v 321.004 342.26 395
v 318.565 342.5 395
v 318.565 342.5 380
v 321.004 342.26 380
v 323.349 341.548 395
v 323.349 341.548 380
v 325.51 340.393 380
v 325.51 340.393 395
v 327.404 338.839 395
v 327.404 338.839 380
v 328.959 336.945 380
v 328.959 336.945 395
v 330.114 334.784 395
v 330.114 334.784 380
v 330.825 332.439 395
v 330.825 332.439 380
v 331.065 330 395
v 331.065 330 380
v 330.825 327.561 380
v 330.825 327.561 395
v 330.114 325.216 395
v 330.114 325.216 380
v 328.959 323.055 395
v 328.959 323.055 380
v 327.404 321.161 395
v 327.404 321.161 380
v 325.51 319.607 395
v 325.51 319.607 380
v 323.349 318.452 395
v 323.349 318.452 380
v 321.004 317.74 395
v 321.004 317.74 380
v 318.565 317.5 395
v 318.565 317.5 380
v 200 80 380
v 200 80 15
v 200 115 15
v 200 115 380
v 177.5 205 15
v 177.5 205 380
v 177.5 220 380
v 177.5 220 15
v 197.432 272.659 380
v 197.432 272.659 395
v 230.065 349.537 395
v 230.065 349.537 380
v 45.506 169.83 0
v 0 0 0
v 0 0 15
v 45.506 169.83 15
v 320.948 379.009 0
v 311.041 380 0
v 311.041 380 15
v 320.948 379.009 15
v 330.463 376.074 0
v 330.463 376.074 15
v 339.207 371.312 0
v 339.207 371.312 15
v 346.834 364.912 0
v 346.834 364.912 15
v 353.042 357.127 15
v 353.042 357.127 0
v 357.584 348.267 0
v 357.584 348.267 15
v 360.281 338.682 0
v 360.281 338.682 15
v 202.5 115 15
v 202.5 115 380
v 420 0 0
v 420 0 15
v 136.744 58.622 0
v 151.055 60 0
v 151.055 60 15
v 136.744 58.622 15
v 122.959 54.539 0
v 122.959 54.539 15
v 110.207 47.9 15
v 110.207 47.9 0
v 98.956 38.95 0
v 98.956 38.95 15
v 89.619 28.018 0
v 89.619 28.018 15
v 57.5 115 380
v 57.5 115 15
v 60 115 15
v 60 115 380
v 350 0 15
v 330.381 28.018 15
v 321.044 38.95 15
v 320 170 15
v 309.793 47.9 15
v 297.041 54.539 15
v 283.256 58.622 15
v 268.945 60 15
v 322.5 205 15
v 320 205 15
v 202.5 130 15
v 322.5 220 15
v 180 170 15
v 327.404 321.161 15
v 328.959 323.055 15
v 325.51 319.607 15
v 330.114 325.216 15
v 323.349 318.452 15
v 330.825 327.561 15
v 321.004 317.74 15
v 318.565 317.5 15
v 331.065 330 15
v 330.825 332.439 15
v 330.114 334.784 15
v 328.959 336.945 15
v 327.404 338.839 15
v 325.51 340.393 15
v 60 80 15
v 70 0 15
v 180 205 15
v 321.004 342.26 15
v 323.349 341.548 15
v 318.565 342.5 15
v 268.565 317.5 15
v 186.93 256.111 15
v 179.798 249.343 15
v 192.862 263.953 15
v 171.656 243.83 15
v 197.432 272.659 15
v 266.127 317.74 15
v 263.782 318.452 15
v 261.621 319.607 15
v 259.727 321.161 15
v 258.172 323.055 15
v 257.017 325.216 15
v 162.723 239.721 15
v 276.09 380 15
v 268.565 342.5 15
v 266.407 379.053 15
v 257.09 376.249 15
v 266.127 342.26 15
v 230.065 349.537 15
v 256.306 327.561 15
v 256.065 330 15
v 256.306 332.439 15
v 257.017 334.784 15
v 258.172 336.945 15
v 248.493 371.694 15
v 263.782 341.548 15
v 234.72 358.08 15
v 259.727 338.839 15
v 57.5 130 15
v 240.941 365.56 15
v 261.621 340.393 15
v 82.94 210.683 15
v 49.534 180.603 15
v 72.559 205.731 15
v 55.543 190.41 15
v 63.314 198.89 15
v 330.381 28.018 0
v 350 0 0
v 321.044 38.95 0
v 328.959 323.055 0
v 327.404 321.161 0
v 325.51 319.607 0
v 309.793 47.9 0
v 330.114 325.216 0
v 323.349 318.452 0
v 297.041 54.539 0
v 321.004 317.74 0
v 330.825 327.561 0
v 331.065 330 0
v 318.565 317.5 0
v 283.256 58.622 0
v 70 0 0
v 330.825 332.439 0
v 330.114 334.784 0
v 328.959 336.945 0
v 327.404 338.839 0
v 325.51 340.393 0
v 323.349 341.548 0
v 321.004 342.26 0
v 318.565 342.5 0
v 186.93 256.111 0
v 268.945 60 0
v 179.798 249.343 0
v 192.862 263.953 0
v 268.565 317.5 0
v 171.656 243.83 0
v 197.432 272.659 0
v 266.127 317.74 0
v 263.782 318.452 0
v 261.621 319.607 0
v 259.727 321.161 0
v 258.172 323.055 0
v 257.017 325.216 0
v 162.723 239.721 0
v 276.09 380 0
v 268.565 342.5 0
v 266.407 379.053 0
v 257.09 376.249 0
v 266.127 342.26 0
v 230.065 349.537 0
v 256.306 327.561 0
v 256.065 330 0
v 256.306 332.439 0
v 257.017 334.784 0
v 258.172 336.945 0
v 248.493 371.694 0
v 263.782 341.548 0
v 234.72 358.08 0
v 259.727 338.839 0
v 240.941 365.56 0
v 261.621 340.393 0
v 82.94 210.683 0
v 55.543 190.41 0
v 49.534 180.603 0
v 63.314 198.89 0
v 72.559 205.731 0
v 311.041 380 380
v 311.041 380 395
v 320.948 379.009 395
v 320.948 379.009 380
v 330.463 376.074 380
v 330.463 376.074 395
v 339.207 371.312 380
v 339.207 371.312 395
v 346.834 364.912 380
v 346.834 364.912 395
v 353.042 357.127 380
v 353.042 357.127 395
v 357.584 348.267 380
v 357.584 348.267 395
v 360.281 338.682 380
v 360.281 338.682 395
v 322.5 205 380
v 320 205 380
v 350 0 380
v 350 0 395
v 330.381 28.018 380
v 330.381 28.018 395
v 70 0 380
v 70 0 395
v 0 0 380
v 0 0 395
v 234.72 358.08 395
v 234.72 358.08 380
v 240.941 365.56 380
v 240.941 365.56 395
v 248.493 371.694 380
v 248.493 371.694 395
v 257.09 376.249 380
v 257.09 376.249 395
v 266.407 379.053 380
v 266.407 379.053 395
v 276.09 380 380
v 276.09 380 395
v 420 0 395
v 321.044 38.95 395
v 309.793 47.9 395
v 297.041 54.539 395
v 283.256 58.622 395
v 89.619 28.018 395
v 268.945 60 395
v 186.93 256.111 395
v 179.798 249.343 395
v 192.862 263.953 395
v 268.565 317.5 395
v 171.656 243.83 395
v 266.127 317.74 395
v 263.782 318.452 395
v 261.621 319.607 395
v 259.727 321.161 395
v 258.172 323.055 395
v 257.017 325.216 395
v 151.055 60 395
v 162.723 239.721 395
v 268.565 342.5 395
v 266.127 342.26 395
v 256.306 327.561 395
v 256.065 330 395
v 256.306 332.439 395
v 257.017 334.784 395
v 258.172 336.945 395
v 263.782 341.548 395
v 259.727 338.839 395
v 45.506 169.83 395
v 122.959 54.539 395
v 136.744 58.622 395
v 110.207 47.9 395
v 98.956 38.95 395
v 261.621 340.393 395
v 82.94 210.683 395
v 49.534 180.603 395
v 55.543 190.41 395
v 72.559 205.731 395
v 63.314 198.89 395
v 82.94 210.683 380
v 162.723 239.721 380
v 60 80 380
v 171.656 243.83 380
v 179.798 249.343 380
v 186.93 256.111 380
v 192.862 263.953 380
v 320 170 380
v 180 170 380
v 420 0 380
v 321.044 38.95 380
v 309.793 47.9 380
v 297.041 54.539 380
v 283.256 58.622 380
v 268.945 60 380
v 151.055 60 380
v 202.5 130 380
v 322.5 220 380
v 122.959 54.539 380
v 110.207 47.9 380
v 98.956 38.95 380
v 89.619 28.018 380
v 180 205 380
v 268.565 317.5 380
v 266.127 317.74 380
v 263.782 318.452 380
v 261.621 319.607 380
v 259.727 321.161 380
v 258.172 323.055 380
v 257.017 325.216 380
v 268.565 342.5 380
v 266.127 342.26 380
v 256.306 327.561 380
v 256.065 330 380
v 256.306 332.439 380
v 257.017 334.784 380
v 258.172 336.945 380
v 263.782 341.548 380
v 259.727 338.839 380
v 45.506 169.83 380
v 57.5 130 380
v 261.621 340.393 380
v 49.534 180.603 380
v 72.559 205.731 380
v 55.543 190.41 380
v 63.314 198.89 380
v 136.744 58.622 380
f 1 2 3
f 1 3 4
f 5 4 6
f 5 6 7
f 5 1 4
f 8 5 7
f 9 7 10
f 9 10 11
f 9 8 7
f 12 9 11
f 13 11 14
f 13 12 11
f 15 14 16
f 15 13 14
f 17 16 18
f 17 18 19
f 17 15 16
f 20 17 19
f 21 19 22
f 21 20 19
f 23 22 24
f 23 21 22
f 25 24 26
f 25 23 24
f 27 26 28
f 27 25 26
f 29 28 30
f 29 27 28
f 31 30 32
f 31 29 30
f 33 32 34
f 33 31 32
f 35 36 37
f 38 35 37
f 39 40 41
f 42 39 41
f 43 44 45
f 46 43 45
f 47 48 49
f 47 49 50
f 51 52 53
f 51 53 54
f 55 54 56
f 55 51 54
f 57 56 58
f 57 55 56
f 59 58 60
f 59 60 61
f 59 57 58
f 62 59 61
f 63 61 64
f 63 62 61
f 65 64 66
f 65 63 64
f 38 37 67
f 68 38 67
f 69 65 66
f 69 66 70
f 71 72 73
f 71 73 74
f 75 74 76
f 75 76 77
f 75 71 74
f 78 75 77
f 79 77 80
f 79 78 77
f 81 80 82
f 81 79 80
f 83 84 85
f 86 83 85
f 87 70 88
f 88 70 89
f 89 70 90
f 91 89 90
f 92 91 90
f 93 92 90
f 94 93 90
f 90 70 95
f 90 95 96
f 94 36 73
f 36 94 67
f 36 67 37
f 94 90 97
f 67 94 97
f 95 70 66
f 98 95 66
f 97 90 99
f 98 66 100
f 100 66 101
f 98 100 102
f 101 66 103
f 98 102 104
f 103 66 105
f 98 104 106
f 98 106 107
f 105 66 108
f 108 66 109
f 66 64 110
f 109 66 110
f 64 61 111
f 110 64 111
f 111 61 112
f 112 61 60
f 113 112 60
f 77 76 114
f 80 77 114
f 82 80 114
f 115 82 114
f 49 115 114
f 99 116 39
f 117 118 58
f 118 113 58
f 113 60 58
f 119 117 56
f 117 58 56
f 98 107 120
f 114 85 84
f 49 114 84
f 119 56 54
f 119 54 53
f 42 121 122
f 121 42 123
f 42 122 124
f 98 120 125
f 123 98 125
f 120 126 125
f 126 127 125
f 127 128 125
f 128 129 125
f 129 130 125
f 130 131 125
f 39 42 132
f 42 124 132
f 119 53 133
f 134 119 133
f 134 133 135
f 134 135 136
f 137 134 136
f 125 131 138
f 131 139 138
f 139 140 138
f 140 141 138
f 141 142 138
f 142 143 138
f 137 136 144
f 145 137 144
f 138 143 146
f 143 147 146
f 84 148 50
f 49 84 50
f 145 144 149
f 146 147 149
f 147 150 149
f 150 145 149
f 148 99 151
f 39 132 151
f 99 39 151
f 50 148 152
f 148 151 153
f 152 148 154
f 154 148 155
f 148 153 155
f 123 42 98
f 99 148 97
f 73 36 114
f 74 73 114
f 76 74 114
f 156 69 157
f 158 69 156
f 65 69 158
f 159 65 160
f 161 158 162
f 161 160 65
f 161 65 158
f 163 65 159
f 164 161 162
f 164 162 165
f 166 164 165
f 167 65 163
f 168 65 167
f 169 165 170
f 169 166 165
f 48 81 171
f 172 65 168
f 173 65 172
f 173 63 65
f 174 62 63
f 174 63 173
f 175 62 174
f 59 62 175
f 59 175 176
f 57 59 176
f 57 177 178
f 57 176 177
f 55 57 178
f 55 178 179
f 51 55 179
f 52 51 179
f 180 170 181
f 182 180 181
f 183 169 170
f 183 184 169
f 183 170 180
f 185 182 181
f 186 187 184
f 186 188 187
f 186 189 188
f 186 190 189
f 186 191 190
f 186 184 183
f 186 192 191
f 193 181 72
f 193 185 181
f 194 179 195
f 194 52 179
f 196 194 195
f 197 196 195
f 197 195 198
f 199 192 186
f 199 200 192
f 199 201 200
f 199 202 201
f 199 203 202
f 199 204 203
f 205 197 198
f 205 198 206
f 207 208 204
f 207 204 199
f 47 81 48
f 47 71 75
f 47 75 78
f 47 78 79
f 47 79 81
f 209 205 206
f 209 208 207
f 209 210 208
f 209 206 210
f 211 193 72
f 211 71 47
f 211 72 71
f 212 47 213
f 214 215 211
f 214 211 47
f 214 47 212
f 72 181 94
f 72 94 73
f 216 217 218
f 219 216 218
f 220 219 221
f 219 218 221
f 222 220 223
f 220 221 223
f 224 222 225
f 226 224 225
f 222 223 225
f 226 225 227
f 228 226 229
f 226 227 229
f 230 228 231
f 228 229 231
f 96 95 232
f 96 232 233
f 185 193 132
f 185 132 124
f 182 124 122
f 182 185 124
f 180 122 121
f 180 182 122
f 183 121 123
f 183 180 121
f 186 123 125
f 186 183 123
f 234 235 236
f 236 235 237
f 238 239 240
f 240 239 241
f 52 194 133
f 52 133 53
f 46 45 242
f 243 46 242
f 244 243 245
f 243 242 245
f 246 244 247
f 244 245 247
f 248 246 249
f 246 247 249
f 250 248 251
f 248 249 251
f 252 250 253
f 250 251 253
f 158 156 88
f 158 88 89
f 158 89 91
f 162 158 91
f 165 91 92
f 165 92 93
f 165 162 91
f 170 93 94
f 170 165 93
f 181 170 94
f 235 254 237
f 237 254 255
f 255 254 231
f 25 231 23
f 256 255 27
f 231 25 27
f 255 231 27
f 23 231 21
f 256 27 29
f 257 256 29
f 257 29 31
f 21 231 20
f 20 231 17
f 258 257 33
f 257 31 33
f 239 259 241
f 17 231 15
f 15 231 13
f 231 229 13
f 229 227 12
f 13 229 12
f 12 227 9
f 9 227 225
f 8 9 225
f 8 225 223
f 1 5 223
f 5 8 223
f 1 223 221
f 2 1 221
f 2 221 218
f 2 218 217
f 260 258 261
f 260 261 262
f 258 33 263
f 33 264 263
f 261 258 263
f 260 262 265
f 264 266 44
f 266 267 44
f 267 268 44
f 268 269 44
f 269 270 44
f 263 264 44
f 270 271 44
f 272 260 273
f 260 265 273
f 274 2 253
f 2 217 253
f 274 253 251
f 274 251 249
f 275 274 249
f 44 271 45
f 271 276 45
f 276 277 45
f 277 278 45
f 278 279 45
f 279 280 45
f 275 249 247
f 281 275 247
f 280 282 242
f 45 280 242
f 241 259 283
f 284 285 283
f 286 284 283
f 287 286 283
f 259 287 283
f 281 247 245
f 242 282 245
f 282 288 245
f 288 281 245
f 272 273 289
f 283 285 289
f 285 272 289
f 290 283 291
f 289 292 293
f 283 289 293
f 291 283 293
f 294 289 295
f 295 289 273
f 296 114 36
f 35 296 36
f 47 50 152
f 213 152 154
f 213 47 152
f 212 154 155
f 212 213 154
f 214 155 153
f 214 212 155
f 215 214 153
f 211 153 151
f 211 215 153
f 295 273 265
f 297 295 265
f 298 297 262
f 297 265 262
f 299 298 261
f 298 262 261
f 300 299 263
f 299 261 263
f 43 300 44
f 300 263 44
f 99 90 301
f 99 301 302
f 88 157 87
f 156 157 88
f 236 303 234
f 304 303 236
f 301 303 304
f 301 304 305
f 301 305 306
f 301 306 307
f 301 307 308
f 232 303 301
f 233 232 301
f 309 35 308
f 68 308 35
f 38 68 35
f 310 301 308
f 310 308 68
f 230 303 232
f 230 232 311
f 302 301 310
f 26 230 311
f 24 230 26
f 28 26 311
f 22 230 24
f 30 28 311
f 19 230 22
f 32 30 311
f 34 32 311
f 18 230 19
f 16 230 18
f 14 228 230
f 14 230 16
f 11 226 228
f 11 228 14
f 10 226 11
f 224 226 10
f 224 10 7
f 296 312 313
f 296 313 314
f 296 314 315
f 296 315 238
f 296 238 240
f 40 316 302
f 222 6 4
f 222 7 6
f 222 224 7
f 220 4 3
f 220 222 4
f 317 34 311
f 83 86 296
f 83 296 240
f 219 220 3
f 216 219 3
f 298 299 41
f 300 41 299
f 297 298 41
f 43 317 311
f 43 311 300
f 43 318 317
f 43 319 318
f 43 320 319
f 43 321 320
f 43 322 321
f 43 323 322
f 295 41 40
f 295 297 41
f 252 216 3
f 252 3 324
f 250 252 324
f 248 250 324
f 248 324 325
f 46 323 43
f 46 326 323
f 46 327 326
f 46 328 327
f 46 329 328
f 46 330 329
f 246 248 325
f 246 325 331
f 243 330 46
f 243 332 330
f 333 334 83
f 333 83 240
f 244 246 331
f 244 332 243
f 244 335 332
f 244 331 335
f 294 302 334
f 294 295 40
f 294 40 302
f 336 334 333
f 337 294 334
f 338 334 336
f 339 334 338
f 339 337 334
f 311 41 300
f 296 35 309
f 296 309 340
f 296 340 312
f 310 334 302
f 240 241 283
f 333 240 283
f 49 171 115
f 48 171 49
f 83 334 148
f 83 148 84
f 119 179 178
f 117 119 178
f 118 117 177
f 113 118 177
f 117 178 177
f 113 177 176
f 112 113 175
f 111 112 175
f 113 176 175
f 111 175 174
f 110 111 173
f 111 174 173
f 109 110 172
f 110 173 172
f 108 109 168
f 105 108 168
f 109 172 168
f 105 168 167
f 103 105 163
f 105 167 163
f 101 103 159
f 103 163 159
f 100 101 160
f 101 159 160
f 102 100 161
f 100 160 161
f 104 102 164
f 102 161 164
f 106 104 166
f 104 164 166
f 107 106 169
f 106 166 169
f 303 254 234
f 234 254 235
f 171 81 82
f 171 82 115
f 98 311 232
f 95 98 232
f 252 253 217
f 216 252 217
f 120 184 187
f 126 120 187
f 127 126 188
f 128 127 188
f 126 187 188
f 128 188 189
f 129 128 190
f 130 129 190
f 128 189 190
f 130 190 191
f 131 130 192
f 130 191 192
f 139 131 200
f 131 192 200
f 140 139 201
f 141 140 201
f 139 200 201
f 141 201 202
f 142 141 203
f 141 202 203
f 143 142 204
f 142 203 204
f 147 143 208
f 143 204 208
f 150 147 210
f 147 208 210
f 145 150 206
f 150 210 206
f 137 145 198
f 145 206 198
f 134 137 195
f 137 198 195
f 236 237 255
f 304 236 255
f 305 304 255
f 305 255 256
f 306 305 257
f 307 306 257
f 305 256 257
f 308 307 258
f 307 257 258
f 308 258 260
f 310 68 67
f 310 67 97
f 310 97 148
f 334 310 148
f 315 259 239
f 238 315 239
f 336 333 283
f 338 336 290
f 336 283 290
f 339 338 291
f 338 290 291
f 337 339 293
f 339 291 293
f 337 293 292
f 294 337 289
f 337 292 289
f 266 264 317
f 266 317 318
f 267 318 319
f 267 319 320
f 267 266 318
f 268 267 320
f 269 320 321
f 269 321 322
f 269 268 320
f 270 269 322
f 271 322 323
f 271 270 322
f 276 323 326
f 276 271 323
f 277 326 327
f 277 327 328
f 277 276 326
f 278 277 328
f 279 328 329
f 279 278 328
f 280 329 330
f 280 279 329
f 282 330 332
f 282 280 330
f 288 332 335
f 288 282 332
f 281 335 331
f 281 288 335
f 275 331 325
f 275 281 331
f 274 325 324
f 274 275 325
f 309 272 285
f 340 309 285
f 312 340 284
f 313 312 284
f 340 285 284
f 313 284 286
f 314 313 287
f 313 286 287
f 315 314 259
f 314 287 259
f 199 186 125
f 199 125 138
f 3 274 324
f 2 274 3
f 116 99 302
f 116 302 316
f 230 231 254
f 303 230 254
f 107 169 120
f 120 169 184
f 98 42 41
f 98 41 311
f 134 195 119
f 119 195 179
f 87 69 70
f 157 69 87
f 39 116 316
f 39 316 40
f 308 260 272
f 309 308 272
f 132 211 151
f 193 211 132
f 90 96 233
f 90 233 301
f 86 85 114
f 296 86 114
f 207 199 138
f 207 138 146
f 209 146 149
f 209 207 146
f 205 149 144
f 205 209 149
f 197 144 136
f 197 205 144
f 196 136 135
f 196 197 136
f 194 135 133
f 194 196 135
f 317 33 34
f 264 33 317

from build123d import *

# Parameters (mm, degrees)
BOSS_EXTRUDE1_DEPTH = 15
BOSS_EXTRUDE2_DEPTH = 365


with BuildPart() as part:
    # Sketch1 → Boss-Extrude1 (new body)
    with BuildSketch(Plane.XY):
        with BuildLine():
            Line((0, 0), (45.50587847, 169.830250493))
            ThreePointArc((45.50587847, 169.830250493), (59.224787839, 194.836520244), (82.940219448, 210.682665034))
            Line((82.940219448, 210.682665034), (162.723089982, 239.721255113))
            ThreePointArc((162.723089982, 239.721255113), (183.503155924, 252.5803501), (197.43217259, 272.658944651))
            Line((197.43217259, 272.658944651), (230.064782718, 349.536556424))
            ThreePointArc((230.064782718, 349.536556424), (248.493176125, 371.694291103), (276.090025391, 380))
            Line((276.090025391, 380), (311.040765772, 380))
            ThreePointArc((311.040765772, 380), (343.180146256, 368.302222156), (360.281153423, 338.682408883))
            Line((360.281153423, 338.682408883), (420, 0))
            Line((420, 0), (350, 0))
            Line((350, 0), (330.381422238, 28.018232726))
            ThreePointArc((330.381422238, 28.018232726), (303.576164909, 51.525812488), (268.945018916, 60))
            Line((268.945018916, 60), (151.054981084, 60))
            ThreePointArc((151.054981084, 60), (116.423835091, 51.525812488), (89.618577762, 28.018232726))
            Line((89.618577762, 28.018232726), (70, 0))
            Line((70, 0), (0, 0))
        make_face()
        with BuildLine():
            Line((268.565395581, 342.5), (318.565395581, 342.5))
            ThreePointArc((318.565395581, 342.5), (331.065395581, 330), (318.565395581, 317.5))
            Line((318.565395581, 317.5), (268.565395581, 317.5))
            ThreePointArc((268.565395581, 317.5), (256.065395581, 330), (268.565395581, 342.5))
        make_face(mode=Mode.SUBTRACT)
    boss_extrude1 = extrude(amount=BOSS_EXTRUDE1_DEPTH)

    # Sketch3 → Boss-Extrude2 (add)
    with BuildSketch(Plane.XY.offset(15)):
        Polygon((200, 115), (202.5, 115), (202.5, 130), (57.5, 130), (57.5, 115), (60, 115), (60, 80), (200, 80), align=None)
        Polygon((177.5, 220), (322.5, 220), (322.5, 205), (320, 205), (320, 170), (180, 170), (180, 205), (177.5, 205), align=None)
    extrude(amount=BOSS_EXTRUDE2_DEPTH)

    # Mirror1: Boss-Extrude1 across plane
    add(boss_extrude1.mirror(Plane.XY.offset(197.5)))


solid = part.part
